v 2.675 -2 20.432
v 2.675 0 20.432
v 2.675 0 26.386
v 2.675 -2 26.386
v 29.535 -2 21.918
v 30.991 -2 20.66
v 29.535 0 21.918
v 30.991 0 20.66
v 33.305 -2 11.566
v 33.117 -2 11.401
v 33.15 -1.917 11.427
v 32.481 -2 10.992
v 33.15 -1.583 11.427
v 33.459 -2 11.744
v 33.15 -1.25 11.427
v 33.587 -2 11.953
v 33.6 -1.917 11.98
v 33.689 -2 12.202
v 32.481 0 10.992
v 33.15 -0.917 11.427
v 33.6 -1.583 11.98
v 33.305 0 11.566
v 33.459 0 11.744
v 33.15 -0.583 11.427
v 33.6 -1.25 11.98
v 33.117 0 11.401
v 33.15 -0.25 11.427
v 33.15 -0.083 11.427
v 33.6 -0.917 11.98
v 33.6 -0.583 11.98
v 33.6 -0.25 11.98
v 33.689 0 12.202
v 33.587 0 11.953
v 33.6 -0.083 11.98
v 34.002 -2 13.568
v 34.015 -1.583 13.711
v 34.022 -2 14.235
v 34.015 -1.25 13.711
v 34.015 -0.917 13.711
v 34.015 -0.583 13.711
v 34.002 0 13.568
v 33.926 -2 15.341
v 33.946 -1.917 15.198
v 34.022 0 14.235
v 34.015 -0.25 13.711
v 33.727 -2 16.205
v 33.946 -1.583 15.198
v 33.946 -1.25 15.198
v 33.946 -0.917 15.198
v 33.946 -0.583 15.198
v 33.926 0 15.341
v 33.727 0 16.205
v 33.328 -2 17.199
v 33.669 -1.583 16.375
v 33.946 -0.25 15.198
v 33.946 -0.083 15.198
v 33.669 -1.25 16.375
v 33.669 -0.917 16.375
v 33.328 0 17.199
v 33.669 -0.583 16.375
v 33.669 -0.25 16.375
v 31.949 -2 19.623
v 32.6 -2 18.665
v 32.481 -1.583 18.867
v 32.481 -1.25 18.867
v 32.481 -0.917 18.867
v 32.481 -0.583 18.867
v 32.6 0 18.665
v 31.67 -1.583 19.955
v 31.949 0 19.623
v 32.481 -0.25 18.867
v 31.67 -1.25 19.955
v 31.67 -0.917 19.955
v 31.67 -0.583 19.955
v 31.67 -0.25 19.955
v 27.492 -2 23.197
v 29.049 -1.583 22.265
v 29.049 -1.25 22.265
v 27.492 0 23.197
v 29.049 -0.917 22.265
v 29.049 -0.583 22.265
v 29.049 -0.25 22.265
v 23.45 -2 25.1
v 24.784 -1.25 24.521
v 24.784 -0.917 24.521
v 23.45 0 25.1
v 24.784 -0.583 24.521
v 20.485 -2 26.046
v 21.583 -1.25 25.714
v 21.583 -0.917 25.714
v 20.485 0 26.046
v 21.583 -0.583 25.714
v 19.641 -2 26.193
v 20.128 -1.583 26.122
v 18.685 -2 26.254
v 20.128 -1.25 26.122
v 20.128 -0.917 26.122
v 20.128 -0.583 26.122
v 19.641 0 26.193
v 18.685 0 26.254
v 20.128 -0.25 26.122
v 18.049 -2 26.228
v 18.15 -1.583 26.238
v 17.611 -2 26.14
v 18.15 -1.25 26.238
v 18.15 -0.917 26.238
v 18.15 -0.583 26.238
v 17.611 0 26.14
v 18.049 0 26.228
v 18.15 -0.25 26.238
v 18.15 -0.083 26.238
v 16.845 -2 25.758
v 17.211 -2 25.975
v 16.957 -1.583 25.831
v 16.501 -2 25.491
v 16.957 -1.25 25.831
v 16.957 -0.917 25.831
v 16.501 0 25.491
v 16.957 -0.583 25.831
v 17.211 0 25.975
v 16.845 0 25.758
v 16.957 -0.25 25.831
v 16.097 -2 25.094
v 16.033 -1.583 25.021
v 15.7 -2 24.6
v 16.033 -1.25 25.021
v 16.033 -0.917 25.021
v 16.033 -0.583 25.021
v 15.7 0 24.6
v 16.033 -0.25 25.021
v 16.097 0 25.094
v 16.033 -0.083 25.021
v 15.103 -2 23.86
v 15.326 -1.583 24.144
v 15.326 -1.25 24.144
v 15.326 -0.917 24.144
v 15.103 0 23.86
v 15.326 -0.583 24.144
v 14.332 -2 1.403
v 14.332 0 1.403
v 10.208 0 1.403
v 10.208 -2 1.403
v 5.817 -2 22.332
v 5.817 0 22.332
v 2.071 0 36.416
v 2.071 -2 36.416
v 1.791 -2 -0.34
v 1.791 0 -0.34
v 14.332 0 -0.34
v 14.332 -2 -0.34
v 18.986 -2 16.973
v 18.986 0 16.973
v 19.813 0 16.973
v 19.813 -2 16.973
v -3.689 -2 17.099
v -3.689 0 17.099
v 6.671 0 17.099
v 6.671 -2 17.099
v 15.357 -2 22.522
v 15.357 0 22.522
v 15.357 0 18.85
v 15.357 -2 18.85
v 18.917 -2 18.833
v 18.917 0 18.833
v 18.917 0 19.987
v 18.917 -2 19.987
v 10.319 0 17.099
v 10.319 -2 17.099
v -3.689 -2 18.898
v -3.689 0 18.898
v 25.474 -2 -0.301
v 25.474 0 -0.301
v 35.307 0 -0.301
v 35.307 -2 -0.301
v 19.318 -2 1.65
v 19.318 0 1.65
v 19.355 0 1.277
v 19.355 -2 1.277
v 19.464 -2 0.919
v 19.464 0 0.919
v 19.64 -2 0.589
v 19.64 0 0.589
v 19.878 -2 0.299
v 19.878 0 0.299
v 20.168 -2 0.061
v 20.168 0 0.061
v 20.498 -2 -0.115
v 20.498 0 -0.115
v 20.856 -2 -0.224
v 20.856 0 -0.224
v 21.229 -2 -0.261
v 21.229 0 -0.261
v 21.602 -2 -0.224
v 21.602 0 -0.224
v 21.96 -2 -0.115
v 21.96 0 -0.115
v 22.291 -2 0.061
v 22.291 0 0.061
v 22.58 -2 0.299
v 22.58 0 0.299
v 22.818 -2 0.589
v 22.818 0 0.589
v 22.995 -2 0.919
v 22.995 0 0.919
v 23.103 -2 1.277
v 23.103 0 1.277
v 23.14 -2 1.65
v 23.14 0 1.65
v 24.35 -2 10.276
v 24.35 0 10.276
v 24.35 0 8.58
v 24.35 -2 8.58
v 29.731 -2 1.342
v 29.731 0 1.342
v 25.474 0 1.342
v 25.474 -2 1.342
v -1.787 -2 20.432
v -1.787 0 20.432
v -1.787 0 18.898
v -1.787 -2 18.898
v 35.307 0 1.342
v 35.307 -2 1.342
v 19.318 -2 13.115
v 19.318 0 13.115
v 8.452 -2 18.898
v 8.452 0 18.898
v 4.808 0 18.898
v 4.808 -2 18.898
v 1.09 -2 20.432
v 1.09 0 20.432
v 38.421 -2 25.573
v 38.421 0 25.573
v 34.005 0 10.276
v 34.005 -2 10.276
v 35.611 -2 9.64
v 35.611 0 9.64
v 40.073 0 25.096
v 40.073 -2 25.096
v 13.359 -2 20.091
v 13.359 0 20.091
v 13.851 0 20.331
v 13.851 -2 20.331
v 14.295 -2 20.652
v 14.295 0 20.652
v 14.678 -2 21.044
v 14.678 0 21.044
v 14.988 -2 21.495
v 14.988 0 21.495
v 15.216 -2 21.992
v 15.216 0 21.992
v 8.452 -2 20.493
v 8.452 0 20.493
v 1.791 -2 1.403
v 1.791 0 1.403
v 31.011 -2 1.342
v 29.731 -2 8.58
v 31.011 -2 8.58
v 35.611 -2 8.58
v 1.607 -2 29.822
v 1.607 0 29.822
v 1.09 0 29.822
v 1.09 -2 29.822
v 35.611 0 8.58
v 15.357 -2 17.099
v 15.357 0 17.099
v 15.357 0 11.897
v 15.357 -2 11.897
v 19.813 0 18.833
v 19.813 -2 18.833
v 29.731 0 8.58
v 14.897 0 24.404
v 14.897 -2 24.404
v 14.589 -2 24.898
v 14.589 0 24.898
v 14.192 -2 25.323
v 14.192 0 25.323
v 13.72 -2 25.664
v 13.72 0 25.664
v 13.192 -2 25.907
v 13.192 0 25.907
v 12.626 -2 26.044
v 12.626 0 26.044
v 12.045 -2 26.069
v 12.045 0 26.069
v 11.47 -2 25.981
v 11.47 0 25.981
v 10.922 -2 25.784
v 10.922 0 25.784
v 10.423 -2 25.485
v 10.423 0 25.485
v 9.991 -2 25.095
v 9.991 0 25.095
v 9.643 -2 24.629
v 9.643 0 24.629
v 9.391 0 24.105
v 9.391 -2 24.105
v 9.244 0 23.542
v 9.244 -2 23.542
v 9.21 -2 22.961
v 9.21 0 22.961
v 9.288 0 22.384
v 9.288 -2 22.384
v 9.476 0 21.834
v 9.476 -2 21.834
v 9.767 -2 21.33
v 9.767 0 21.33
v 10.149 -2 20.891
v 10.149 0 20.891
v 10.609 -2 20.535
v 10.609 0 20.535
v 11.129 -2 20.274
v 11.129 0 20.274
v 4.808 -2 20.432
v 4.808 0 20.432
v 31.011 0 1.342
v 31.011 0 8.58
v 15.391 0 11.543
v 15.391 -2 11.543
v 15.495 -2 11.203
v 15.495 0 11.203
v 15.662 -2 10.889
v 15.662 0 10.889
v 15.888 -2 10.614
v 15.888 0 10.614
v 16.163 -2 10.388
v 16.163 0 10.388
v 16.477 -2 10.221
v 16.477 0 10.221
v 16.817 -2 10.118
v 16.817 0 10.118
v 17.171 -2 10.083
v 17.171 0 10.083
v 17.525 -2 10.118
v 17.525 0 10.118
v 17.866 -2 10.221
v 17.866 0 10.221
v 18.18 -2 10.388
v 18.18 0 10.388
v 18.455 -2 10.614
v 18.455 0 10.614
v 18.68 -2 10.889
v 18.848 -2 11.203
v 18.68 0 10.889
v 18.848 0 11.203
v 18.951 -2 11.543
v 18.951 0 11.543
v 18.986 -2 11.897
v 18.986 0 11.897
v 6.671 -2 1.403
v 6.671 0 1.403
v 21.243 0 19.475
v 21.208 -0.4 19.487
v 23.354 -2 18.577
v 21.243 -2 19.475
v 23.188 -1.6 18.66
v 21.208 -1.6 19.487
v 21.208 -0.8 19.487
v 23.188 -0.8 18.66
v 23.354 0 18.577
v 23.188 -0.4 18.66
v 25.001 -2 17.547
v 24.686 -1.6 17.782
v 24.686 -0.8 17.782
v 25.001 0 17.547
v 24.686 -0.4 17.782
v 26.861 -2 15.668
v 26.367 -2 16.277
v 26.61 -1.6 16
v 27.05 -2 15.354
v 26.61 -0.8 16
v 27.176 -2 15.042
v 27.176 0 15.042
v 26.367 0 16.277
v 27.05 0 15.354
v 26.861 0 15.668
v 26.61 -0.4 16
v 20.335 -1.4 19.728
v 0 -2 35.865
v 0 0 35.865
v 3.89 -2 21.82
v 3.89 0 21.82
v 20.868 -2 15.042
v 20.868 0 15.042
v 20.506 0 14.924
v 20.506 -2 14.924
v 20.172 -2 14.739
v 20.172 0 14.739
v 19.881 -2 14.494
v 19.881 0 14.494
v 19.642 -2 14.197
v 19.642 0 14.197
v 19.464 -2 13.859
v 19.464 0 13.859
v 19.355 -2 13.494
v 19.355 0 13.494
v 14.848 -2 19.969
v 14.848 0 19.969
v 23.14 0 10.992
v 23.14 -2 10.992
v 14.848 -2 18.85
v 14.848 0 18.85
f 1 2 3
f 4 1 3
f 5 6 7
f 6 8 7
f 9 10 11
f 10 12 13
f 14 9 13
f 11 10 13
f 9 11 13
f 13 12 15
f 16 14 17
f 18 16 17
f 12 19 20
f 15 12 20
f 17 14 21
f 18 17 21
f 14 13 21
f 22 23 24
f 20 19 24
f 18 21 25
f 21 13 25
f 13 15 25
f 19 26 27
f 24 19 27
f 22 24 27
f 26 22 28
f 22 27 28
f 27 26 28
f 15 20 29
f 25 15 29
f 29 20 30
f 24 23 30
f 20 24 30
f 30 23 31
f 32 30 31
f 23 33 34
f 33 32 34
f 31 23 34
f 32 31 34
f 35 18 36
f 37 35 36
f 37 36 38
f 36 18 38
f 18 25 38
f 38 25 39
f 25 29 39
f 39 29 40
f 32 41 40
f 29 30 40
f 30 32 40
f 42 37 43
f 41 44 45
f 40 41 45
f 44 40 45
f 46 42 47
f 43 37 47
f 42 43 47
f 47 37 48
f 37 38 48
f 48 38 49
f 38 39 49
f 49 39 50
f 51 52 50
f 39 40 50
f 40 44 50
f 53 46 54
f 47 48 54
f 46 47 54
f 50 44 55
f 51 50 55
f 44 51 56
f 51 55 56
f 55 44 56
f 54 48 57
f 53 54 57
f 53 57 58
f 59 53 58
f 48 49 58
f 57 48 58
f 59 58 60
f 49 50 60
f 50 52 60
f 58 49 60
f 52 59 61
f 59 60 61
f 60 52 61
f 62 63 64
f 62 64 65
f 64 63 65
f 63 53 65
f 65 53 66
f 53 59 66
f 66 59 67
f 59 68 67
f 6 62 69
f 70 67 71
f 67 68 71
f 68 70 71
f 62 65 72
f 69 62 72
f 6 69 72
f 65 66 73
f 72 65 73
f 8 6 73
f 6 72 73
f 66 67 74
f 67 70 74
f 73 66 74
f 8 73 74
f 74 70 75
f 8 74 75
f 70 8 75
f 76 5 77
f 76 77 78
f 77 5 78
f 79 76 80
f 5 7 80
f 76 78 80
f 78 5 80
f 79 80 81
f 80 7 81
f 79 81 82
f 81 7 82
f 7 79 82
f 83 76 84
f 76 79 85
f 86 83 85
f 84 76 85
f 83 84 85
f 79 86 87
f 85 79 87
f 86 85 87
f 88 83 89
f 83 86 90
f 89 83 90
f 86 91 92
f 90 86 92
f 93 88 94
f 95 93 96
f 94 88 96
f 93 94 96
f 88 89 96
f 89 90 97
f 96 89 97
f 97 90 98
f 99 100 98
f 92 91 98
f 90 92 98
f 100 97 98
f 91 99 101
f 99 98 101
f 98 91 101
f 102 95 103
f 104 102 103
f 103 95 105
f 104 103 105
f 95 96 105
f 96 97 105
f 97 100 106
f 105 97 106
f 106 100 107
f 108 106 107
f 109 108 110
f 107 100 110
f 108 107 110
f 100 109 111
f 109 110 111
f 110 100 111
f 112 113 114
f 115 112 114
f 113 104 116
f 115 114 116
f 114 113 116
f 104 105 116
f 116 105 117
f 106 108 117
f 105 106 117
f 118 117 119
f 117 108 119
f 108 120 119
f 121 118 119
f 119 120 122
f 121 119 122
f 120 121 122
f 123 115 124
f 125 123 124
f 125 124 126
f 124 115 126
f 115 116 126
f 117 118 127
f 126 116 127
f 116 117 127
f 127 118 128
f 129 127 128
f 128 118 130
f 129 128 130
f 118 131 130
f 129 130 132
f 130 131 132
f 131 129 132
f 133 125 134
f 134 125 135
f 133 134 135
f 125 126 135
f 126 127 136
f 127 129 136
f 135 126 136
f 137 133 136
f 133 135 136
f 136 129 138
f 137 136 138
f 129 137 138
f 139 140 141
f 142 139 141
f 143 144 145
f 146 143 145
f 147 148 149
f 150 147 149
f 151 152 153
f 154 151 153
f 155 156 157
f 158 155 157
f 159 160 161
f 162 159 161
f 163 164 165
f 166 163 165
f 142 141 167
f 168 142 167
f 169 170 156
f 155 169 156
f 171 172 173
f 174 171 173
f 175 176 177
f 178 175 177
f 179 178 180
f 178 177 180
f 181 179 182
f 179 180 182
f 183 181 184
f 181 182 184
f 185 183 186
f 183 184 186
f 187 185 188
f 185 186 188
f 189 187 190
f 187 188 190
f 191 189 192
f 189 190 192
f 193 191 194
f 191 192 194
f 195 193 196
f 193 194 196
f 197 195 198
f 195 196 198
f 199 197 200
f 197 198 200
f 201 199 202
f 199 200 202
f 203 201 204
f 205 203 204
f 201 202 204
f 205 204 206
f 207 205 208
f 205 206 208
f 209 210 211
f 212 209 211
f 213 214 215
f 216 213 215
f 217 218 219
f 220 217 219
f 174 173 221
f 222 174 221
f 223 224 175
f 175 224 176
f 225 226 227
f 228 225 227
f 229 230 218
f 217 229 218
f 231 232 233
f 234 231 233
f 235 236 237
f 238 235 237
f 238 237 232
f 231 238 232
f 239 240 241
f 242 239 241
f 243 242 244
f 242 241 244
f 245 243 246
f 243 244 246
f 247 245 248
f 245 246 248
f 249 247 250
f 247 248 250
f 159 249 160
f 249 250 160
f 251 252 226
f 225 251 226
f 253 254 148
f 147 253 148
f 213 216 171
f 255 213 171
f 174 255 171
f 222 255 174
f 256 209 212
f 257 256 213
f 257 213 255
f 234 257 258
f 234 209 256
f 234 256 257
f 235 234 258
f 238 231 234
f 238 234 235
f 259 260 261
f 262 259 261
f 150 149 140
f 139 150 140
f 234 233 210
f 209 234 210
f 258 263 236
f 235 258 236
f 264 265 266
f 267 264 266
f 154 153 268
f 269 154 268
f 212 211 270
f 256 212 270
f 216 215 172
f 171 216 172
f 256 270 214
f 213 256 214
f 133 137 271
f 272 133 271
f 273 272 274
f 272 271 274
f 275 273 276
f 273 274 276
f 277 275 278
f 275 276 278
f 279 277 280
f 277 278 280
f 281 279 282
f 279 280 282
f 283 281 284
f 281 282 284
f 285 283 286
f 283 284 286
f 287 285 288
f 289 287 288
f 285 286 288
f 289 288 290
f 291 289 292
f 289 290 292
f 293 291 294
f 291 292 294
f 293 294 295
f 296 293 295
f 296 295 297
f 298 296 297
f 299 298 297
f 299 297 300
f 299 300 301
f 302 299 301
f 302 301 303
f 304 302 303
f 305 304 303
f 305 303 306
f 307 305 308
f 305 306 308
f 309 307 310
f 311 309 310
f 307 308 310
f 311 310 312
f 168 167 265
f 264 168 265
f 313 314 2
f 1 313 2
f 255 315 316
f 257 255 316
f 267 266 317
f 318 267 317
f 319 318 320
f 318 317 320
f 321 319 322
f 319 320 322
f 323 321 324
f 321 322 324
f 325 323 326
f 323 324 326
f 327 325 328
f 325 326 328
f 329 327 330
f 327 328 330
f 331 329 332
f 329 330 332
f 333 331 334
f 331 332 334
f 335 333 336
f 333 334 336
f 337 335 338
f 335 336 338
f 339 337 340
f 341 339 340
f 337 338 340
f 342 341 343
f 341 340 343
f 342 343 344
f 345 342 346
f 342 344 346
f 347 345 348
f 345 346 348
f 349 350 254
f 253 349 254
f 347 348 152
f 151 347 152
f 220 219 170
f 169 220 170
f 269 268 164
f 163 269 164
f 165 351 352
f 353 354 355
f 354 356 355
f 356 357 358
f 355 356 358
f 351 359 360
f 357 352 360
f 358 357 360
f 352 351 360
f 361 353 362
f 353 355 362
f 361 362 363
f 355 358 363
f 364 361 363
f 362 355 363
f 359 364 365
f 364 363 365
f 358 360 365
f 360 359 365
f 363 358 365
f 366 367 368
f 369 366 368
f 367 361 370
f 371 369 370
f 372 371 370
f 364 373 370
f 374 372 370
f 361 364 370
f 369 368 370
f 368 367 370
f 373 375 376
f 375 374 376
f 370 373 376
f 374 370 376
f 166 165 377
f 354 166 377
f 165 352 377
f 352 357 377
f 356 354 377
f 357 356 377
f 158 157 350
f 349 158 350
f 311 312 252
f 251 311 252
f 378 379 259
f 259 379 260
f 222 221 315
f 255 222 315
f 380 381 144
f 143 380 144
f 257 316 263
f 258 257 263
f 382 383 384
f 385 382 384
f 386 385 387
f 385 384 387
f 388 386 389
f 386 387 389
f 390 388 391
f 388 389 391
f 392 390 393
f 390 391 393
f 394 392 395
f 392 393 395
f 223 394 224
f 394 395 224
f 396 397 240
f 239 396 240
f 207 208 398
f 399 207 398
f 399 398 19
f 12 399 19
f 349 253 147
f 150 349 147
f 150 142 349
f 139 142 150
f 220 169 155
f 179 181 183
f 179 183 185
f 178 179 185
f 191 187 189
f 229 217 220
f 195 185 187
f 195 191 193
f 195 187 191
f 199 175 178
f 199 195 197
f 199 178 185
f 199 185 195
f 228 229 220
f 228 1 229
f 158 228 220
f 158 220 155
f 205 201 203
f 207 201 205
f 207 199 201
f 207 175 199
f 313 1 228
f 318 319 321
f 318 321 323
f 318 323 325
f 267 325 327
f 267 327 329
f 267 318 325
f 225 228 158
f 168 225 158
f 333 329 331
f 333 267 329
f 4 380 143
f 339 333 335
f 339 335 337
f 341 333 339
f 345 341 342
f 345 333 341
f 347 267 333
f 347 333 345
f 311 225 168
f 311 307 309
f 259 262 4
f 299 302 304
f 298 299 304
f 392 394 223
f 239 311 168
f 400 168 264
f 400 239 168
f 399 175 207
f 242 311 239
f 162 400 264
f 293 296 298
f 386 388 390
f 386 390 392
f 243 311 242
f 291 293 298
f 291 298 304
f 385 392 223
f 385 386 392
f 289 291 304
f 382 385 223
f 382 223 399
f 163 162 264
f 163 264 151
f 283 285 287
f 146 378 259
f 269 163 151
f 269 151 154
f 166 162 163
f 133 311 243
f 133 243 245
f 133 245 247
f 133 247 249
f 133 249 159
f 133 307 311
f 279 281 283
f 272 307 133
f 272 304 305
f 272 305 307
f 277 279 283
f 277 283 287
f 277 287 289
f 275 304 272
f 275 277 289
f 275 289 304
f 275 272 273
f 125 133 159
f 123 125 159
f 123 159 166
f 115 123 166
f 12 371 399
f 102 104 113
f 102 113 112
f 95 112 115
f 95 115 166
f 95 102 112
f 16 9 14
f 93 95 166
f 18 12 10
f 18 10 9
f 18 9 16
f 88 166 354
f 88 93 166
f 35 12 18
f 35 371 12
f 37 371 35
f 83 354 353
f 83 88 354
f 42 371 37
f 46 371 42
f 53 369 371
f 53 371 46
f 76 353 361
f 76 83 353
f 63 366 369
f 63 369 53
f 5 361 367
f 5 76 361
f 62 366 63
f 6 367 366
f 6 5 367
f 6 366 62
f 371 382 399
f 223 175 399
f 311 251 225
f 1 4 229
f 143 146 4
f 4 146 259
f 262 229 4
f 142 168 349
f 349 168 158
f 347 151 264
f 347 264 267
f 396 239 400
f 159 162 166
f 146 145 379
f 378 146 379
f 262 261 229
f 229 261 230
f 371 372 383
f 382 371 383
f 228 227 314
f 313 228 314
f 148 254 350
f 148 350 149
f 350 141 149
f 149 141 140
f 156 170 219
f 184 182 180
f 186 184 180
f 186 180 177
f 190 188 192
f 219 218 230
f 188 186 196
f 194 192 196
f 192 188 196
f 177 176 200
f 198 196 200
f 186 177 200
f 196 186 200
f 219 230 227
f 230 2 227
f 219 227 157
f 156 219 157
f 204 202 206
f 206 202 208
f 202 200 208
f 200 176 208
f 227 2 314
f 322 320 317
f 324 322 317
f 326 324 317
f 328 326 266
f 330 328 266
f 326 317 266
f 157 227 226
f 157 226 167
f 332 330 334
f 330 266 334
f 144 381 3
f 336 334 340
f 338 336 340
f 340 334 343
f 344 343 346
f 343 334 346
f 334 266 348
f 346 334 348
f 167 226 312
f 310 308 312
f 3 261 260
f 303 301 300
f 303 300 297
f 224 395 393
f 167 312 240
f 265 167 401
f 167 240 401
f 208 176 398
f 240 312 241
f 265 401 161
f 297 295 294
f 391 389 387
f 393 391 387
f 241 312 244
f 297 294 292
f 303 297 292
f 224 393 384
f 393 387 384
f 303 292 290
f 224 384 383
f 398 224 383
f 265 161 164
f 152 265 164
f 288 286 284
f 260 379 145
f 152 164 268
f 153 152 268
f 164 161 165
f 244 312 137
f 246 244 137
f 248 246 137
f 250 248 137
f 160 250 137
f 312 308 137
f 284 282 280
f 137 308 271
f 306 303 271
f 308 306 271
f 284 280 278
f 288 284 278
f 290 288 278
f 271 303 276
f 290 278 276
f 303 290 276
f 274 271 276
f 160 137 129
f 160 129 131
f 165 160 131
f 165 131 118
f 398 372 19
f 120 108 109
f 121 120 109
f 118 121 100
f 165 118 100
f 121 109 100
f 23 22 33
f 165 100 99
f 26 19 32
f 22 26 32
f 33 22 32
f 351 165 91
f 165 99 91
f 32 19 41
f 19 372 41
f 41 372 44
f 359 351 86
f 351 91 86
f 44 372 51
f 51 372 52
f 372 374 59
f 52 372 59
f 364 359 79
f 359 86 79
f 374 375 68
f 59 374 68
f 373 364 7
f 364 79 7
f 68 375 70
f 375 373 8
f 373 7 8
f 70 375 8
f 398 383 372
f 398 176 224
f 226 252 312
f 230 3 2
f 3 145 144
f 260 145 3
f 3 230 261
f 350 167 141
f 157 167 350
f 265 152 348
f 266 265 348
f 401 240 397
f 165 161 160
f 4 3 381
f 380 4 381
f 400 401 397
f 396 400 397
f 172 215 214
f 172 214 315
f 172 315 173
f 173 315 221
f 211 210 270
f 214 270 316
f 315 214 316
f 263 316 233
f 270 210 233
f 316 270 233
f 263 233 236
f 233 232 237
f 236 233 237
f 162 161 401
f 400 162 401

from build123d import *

# Parameters (mm, degrees)
F1_DEPTH = 2


# Not quite as in the source:
# - a feature of the source that left no trace in its solid (it failed there, or was rolled back) is left out


with BuildPart() as f1:
    # F0 (on Front) → F1 (new body)
    with BuildSketch(Plane.XZ):
        with BuildLine():
            Line((18.9171390745, 18.8327007444), (18.9171390745, 19.9865035199))
            add(Edge.make_bspline(
                [(18.9171390745, 19.9865035199), (20.2359017059, 19.7609265773), (20.9778353537, 19.6205597026), (23.2221259054, 18.699726427), (24.7231770067, 17.8086116304), (25.7698344015, 16.9044499376), (26.9919522107, 15.6755559146), (27.1760820528, 15.0417076929)],
                knots=[0, 0, 0, 0, 0.2179321827, 0.4264477532, 0.6140262018, 0.7851447158, 1, 1, 1, 1], degree=3))
            Line((27.1760820528, 15.0417076929), (20.8682008088, 15.0417076929))
            ThreePointArc((20.8682008088, 15.0417076929), (19.753969154, 14.3510608736), (19.318478182, 13.1145929918))
            Line((19.318478182, 13.1145929918), (19.318478182, 1.6501822975))
            ThreePointArc((19.318478182, 1.6501822975), (21.2292131037, -0.2605526242), (23.1399480253, 1.6501822975))
            Line((23.1399480253, 1.6501822975), (23.1399480253, 10.9915547073))
            Line((23.1399480253, 10.9915547073), (32.4813202024, 10.9915547073))
            add(Edge.make_bspline(
                [(32.4813202024, 10.9915547073), (32.7173913015, 11.1297281374), (33.1759580653, 11.3981287793), (33.6647764756, 11.943610763), (33.8785442051, 12.9474288042), (34.0688789671, 13.6968216831), (33.9783273465, 15.2441055836), (33.7191306214, 16.3712863899), (33.0805074051, 17.736024655), (32.5118657998, 18.8903594103), (31.6952000931, 19.9920483371), (30.3992394359, 21.2421100827), (29.0660577632, 22.3165505623), (27.023596623, 23.4836145379), (24.8210679729, 24.5125473654), (23.0257936504, 25.3081835207), (21.5598125958, 25.6984832194), (20.1925631903, 26.2037521602), (18.1718154029, 26.3052282349), (17.4545886694, 26.1074868938), (16.9452981604, 25.8397557796), (16.5052029261, 25.5141227487), (16.0173593733, 25.032961087), (15.6388983087, 24.5073680239), (15.2971428532, 24.1187135914), (15.2342961271, 24.0202073944), (15.1027834162, 23.8599643513)],
                knots=[0, 0, 0, 0, 0.0347440285, 0.0675998285, 0.1060000091, 0.1409634696, 0.1884405393, 0.2312071797, 0.278406367, 0.3225834899, 0.3679062968, 0.4197184745, 0.4708155203, 0.5303573368, 0.5916893616, 0.6460983797, 0.6931553162, 0.7409705446, 0.7957371438, 0.829037657, 0.8575649043, 0.886308658, 0.9185072385, 0.9504623164, 0.9766266121, 1, 1, 1, 1], degree=3))
            ThreePointArc((15.1027834162, 23.8599643513), (10.197746642, 25.3005876217), (11.1293799055, 20.2739743856))
            Line((11.1293799055, 20.2739743856), (8.4521435651, 20.4934416608))
            Line((8.4521435651, 20.4934416608), (8.4521435651, 18.8977912164))
            Line((8.4521435651, 18.8977912164), (4.807944844, 18.8977912164))
            Line((4.807944844, 18.8977912164), (4.807944844, 20.4323317588))
            Line((4.807944844, 20.4323317588), (2.6752410345, 20.4323317588))
            Line((2.6752410345, 20.4323317588), (2.6752410345, 26.3858548469))
            Line((2.6752410345, 26.3858548469), (3.8895721523, 21.8198716526))
            Line((3.8895721523, 21.8198716526), (5.8167126214, 22.3323979893))
            Line((5.8167126214, 22.3323979893), (2.0711510672, 36.4160123011))
            Line((2.0711510672, 36.4160123011), (0, 35.8651860971))
            Line((0, 35.8651860971), (1.6072647653, 29.8217406155))
            Line((1.6072647653, 29.8217406155), (1.0897519525, 29.8217406155))
            Line((1.0897519525, 29.8217406155), (1.0897519525, 20.4323317588))
            Line((1.0897519525, 20.4323317588), (-1.7866106892, 20.4323317588))
            Line((-1.7866106892, 20.4323317588), (-1.7866106892, 18.8977912164))
            Line((-1.7866106892, 18.8977912164), (-3.689032536, 18.8977912164))
            Line((-3.689032536, 18.8977912164), (-3.689032536, 17.0990628984))
            Line((-3.689032536, 17.0990628984), (6.6705888528, 17.0990628984))
            Line((6.6705888528, 17.0990628984), (6.6705888528, 1.4034443302))
            Line((6.6705888528, 1.4034443302), (1.7907759175, 1.4034443302))
            Line((1.7907759175, 1.4034443302), (1.7907759175, -0.3403924929))
            Line((1.7907759175, -0.3403924929), (14.3317757174, -0.3403924929))
            Line((14.3317757174, -0.3403924929), (14.3317757174, 1.4034443302))
            Line((14.3317757174, 1.4034443302), (10.2082798046, 1.4034443302))
            Line((10.2082798046, 1.4034443302), (10.3189582005, 17.0990628984))
            Line((10.3189582005, 17.0990628984), (15.356608129, 17.0990628984))
            Line((15.356608129, 17.0990628984), (15.356608129, 11.8973655189))
            ThreePointArc((15.356608129, 11.8973655189), (17.1713152045, 10.0826584434), (18.98602228, 11.8973655189))
            Line((18.98602228, 11.8973655189), (18.98602228, 16.9728393323))
            Line((18.98602228, 16.9728393323), (19.8126273521, 16.9728393323))
            Line((19.8126273521, 16.9728393323), (19.8126273521, 18.8327007444))
            Line((19.8126273521, 18.8327007444), (18.9171390745, 18.8327007444))
        make_face()
        with BuildLine():
            ThreePointArc((13.3592773256, 20.0911778564), (14.6775576036, 21.0436813613), (15.356608129, 22.5215230991))
            Line((15.356608129, 22.5215230991), (15.356608129, 18.8504233956))
            Line((15.356608129, 18.8504233956), (14.8478032858, 18.8504233956))
            Line((14.8478032858, 18.8504233956), (14.8478032858, 19.9691554815))
            Line((14.8478032858, 19.9691554815), (13.3592773256, 20.0911778564))
        make_face(mode=Mode.SUBTRACT)
    extrude(amount=F1_DEPTH)


with BuildPart() as f1b:
    # F0 (on Front) → F1, piece 2 (new body)
    with BuildSketch(Plane.XZ):
        Polygon((38.4207926691, 25.5733374506), (34.0049751103, 10.2760819718), (24.3503656238, 10.2760819718), (24.3503656238, 8.5804695264), (29.7309551388, 8.5804695264), (29.7309551388, 1.3424385106), (25.474363938, 1.3424385106), (25.474363938, -0.3008880303), (35.3066762154, -0.3008880303), (35.3066762154, 1.3424385106), (31.0113914311, 1.3424385106), (31.0113914311, 8.5804695264), (35.6110706925, 8.5804695264), (35.6110706925, 9.6396217123), (40.0729418852, 25.096415984), align=None)
    extrude(amount=F1_DEPTH)


solid = Compound([f1.part, f1b.part])
